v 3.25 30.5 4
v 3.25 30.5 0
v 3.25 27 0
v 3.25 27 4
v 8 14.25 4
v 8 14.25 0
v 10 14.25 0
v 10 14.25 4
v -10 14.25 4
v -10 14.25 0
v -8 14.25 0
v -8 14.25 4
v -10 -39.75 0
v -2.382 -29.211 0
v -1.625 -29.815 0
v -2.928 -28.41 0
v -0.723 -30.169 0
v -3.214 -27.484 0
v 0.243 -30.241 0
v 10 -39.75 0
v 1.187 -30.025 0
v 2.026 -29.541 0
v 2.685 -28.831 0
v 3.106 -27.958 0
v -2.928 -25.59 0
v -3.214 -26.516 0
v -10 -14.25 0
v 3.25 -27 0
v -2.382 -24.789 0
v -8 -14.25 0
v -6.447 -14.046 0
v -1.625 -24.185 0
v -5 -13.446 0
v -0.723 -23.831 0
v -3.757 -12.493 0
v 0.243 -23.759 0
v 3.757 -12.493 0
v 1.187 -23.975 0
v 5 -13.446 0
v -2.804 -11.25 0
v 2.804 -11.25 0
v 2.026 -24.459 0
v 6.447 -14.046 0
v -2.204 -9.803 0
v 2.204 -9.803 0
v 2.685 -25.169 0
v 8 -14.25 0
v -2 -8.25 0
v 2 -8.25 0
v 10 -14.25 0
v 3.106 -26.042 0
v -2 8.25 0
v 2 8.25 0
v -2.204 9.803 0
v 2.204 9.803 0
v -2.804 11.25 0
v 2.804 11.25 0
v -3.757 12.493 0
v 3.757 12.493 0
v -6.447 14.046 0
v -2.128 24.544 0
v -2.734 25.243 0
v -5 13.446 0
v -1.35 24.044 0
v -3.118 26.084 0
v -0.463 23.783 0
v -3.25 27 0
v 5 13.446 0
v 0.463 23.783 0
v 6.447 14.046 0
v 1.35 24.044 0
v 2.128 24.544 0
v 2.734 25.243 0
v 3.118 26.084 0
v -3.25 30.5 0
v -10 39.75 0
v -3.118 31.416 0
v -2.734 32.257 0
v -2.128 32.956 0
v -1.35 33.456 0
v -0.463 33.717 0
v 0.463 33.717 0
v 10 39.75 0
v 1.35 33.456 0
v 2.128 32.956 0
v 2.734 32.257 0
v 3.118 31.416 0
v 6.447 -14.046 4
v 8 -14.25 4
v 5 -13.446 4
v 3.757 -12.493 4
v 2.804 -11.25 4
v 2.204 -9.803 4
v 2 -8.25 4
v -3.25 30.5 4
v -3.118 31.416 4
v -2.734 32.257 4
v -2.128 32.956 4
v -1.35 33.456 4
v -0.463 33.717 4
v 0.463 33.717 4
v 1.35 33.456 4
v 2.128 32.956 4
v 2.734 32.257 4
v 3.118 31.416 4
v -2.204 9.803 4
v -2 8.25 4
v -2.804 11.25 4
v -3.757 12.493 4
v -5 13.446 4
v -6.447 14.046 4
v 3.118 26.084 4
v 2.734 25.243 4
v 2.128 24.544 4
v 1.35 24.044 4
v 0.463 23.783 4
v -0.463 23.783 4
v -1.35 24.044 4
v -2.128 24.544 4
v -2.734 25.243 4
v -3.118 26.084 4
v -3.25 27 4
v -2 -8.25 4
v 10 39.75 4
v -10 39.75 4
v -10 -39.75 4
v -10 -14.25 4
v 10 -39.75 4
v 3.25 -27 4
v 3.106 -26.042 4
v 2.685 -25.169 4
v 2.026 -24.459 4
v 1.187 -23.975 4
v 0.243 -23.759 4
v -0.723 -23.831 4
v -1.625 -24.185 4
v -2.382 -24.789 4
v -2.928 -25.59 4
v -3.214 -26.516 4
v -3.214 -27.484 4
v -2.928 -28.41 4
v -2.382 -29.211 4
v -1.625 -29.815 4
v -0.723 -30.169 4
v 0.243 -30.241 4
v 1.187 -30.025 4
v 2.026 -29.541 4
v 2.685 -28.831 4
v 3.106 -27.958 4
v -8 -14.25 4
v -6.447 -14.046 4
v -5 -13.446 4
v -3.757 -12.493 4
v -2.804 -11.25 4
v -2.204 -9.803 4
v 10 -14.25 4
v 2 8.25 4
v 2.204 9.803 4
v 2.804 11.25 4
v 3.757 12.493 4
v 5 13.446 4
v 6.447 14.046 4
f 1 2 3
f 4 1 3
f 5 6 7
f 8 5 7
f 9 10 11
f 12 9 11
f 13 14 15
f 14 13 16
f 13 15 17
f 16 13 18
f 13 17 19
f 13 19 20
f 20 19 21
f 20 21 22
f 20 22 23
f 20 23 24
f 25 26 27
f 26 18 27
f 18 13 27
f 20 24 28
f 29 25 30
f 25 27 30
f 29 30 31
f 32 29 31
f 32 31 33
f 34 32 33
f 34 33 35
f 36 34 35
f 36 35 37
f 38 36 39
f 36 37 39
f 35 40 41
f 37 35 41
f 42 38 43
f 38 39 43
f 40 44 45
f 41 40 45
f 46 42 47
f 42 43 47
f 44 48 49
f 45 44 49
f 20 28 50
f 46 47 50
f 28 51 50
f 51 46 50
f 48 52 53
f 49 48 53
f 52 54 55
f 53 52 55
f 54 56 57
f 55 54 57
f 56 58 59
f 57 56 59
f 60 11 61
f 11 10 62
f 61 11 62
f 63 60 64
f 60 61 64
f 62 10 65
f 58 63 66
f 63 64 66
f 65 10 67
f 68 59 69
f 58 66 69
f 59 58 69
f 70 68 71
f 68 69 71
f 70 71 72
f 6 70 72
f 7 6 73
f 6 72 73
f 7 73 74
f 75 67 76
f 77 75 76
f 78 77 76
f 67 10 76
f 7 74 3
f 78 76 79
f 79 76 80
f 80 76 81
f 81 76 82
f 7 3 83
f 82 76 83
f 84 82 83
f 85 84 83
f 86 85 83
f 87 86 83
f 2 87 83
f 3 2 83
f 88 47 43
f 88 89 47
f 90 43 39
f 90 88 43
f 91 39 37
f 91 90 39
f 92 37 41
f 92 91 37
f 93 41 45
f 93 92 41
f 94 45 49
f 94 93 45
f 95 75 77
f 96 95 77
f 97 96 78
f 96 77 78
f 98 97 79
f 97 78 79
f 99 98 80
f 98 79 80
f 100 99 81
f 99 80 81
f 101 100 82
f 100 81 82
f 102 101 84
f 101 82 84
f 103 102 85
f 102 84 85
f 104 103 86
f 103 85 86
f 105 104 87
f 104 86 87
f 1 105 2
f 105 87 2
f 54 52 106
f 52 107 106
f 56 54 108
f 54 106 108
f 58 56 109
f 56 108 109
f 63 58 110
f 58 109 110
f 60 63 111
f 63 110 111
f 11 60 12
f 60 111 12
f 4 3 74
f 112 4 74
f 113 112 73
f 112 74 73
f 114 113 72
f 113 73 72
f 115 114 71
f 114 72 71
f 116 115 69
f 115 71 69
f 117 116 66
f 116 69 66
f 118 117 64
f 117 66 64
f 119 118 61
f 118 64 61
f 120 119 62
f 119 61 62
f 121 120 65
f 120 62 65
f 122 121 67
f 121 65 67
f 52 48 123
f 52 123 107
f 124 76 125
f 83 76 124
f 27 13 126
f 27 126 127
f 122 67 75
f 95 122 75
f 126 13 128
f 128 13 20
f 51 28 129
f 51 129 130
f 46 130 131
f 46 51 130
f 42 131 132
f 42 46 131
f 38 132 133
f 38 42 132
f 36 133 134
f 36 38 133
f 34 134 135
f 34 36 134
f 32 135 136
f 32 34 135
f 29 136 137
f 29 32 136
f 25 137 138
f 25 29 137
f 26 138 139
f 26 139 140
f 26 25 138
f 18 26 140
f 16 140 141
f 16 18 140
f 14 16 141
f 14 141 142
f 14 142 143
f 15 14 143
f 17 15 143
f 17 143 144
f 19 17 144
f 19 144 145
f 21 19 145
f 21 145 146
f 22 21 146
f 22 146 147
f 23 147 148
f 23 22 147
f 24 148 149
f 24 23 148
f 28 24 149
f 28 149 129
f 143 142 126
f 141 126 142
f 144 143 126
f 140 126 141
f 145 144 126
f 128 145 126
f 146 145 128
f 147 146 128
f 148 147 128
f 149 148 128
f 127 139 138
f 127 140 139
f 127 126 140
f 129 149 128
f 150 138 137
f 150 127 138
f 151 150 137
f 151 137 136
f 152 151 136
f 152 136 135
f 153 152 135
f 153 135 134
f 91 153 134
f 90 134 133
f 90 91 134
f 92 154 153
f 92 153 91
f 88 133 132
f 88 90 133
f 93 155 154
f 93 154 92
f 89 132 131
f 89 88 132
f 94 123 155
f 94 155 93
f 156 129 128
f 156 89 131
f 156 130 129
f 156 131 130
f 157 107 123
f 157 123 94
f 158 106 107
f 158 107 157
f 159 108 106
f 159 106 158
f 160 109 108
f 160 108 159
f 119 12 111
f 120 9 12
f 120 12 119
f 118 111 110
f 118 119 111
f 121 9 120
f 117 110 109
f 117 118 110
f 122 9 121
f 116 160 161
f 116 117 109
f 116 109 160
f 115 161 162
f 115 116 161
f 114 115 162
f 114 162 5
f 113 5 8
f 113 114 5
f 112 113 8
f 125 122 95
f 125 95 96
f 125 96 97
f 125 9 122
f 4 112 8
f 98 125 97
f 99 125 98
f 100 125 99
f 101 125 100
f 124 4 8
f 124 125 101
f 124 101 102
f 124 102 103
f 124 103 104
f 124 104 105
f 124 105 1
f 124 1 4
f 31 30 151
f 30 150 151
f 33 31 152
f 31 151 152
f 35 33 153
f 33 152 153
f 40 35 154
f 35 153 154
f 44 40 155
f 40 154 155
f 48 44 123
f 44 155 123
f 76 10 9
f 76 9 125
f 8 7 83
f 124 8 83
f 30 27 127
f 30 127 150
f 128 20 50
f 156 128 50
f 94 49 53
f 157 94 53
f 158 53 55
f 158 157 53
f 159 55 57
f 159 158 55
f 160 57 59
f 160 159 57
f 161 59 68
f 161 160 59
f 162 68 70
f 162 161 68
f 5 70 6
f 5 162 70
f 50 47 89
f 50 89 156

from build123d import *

# Parameters (mm, degrees)
F0_W     = 20
F0_H     = 25.5
F0_R     = 3.25
F1_DEPTH = 4
F2_W     = 4
F2_H     = 28.5
F3_DEPTH = 4
F4_R     = 6


with BuildPart() as f1:
    # F0 (on Top) → F1 (new body)
    with BuildSketch(Plane.XY):
        with Locations((0, 27)):
            Rectangle(F0_W, F0_H)
        with BuildLine():
            Line((-3.25, 27), (-3.25, 30.5))
            ThreePointArc((-3.25, 30.5), (0, 33.75), (3.25, 30.5))
            Line((3.25, 30.5), (3.25, 27))
            ThreePointArc((3.25, 27), (0, 23.75), (-3.25, 27))
        make_face(mode=Mode.SUBTRACT)
        with Locations((0, -27)):
            Rectangle(F0_W, F0_H)
        with Locations((0, -27)):
            Circle(F0_R, mode=Mode.SUBTRACT)
    extrude(amount=F1_DEPTH)

    # F2 (on Top) → F3 (join)
    with BuildSketch(Plane.XY):
        Rectangle(F2_W, F2_H)
    extrude(amount=F3_DEPTH)

    # F4
    f4_edges = [f1.edges().sort_by_distance(p)[0] for p in [
        (-2, 14.25, 2),
        (2, 14.25, 2),
        (2, -14.25, 2),
        (-2, -14.25, 2),
    ]]
    fillet(f4_edges, radius=F4_R)


solid = f1.part
